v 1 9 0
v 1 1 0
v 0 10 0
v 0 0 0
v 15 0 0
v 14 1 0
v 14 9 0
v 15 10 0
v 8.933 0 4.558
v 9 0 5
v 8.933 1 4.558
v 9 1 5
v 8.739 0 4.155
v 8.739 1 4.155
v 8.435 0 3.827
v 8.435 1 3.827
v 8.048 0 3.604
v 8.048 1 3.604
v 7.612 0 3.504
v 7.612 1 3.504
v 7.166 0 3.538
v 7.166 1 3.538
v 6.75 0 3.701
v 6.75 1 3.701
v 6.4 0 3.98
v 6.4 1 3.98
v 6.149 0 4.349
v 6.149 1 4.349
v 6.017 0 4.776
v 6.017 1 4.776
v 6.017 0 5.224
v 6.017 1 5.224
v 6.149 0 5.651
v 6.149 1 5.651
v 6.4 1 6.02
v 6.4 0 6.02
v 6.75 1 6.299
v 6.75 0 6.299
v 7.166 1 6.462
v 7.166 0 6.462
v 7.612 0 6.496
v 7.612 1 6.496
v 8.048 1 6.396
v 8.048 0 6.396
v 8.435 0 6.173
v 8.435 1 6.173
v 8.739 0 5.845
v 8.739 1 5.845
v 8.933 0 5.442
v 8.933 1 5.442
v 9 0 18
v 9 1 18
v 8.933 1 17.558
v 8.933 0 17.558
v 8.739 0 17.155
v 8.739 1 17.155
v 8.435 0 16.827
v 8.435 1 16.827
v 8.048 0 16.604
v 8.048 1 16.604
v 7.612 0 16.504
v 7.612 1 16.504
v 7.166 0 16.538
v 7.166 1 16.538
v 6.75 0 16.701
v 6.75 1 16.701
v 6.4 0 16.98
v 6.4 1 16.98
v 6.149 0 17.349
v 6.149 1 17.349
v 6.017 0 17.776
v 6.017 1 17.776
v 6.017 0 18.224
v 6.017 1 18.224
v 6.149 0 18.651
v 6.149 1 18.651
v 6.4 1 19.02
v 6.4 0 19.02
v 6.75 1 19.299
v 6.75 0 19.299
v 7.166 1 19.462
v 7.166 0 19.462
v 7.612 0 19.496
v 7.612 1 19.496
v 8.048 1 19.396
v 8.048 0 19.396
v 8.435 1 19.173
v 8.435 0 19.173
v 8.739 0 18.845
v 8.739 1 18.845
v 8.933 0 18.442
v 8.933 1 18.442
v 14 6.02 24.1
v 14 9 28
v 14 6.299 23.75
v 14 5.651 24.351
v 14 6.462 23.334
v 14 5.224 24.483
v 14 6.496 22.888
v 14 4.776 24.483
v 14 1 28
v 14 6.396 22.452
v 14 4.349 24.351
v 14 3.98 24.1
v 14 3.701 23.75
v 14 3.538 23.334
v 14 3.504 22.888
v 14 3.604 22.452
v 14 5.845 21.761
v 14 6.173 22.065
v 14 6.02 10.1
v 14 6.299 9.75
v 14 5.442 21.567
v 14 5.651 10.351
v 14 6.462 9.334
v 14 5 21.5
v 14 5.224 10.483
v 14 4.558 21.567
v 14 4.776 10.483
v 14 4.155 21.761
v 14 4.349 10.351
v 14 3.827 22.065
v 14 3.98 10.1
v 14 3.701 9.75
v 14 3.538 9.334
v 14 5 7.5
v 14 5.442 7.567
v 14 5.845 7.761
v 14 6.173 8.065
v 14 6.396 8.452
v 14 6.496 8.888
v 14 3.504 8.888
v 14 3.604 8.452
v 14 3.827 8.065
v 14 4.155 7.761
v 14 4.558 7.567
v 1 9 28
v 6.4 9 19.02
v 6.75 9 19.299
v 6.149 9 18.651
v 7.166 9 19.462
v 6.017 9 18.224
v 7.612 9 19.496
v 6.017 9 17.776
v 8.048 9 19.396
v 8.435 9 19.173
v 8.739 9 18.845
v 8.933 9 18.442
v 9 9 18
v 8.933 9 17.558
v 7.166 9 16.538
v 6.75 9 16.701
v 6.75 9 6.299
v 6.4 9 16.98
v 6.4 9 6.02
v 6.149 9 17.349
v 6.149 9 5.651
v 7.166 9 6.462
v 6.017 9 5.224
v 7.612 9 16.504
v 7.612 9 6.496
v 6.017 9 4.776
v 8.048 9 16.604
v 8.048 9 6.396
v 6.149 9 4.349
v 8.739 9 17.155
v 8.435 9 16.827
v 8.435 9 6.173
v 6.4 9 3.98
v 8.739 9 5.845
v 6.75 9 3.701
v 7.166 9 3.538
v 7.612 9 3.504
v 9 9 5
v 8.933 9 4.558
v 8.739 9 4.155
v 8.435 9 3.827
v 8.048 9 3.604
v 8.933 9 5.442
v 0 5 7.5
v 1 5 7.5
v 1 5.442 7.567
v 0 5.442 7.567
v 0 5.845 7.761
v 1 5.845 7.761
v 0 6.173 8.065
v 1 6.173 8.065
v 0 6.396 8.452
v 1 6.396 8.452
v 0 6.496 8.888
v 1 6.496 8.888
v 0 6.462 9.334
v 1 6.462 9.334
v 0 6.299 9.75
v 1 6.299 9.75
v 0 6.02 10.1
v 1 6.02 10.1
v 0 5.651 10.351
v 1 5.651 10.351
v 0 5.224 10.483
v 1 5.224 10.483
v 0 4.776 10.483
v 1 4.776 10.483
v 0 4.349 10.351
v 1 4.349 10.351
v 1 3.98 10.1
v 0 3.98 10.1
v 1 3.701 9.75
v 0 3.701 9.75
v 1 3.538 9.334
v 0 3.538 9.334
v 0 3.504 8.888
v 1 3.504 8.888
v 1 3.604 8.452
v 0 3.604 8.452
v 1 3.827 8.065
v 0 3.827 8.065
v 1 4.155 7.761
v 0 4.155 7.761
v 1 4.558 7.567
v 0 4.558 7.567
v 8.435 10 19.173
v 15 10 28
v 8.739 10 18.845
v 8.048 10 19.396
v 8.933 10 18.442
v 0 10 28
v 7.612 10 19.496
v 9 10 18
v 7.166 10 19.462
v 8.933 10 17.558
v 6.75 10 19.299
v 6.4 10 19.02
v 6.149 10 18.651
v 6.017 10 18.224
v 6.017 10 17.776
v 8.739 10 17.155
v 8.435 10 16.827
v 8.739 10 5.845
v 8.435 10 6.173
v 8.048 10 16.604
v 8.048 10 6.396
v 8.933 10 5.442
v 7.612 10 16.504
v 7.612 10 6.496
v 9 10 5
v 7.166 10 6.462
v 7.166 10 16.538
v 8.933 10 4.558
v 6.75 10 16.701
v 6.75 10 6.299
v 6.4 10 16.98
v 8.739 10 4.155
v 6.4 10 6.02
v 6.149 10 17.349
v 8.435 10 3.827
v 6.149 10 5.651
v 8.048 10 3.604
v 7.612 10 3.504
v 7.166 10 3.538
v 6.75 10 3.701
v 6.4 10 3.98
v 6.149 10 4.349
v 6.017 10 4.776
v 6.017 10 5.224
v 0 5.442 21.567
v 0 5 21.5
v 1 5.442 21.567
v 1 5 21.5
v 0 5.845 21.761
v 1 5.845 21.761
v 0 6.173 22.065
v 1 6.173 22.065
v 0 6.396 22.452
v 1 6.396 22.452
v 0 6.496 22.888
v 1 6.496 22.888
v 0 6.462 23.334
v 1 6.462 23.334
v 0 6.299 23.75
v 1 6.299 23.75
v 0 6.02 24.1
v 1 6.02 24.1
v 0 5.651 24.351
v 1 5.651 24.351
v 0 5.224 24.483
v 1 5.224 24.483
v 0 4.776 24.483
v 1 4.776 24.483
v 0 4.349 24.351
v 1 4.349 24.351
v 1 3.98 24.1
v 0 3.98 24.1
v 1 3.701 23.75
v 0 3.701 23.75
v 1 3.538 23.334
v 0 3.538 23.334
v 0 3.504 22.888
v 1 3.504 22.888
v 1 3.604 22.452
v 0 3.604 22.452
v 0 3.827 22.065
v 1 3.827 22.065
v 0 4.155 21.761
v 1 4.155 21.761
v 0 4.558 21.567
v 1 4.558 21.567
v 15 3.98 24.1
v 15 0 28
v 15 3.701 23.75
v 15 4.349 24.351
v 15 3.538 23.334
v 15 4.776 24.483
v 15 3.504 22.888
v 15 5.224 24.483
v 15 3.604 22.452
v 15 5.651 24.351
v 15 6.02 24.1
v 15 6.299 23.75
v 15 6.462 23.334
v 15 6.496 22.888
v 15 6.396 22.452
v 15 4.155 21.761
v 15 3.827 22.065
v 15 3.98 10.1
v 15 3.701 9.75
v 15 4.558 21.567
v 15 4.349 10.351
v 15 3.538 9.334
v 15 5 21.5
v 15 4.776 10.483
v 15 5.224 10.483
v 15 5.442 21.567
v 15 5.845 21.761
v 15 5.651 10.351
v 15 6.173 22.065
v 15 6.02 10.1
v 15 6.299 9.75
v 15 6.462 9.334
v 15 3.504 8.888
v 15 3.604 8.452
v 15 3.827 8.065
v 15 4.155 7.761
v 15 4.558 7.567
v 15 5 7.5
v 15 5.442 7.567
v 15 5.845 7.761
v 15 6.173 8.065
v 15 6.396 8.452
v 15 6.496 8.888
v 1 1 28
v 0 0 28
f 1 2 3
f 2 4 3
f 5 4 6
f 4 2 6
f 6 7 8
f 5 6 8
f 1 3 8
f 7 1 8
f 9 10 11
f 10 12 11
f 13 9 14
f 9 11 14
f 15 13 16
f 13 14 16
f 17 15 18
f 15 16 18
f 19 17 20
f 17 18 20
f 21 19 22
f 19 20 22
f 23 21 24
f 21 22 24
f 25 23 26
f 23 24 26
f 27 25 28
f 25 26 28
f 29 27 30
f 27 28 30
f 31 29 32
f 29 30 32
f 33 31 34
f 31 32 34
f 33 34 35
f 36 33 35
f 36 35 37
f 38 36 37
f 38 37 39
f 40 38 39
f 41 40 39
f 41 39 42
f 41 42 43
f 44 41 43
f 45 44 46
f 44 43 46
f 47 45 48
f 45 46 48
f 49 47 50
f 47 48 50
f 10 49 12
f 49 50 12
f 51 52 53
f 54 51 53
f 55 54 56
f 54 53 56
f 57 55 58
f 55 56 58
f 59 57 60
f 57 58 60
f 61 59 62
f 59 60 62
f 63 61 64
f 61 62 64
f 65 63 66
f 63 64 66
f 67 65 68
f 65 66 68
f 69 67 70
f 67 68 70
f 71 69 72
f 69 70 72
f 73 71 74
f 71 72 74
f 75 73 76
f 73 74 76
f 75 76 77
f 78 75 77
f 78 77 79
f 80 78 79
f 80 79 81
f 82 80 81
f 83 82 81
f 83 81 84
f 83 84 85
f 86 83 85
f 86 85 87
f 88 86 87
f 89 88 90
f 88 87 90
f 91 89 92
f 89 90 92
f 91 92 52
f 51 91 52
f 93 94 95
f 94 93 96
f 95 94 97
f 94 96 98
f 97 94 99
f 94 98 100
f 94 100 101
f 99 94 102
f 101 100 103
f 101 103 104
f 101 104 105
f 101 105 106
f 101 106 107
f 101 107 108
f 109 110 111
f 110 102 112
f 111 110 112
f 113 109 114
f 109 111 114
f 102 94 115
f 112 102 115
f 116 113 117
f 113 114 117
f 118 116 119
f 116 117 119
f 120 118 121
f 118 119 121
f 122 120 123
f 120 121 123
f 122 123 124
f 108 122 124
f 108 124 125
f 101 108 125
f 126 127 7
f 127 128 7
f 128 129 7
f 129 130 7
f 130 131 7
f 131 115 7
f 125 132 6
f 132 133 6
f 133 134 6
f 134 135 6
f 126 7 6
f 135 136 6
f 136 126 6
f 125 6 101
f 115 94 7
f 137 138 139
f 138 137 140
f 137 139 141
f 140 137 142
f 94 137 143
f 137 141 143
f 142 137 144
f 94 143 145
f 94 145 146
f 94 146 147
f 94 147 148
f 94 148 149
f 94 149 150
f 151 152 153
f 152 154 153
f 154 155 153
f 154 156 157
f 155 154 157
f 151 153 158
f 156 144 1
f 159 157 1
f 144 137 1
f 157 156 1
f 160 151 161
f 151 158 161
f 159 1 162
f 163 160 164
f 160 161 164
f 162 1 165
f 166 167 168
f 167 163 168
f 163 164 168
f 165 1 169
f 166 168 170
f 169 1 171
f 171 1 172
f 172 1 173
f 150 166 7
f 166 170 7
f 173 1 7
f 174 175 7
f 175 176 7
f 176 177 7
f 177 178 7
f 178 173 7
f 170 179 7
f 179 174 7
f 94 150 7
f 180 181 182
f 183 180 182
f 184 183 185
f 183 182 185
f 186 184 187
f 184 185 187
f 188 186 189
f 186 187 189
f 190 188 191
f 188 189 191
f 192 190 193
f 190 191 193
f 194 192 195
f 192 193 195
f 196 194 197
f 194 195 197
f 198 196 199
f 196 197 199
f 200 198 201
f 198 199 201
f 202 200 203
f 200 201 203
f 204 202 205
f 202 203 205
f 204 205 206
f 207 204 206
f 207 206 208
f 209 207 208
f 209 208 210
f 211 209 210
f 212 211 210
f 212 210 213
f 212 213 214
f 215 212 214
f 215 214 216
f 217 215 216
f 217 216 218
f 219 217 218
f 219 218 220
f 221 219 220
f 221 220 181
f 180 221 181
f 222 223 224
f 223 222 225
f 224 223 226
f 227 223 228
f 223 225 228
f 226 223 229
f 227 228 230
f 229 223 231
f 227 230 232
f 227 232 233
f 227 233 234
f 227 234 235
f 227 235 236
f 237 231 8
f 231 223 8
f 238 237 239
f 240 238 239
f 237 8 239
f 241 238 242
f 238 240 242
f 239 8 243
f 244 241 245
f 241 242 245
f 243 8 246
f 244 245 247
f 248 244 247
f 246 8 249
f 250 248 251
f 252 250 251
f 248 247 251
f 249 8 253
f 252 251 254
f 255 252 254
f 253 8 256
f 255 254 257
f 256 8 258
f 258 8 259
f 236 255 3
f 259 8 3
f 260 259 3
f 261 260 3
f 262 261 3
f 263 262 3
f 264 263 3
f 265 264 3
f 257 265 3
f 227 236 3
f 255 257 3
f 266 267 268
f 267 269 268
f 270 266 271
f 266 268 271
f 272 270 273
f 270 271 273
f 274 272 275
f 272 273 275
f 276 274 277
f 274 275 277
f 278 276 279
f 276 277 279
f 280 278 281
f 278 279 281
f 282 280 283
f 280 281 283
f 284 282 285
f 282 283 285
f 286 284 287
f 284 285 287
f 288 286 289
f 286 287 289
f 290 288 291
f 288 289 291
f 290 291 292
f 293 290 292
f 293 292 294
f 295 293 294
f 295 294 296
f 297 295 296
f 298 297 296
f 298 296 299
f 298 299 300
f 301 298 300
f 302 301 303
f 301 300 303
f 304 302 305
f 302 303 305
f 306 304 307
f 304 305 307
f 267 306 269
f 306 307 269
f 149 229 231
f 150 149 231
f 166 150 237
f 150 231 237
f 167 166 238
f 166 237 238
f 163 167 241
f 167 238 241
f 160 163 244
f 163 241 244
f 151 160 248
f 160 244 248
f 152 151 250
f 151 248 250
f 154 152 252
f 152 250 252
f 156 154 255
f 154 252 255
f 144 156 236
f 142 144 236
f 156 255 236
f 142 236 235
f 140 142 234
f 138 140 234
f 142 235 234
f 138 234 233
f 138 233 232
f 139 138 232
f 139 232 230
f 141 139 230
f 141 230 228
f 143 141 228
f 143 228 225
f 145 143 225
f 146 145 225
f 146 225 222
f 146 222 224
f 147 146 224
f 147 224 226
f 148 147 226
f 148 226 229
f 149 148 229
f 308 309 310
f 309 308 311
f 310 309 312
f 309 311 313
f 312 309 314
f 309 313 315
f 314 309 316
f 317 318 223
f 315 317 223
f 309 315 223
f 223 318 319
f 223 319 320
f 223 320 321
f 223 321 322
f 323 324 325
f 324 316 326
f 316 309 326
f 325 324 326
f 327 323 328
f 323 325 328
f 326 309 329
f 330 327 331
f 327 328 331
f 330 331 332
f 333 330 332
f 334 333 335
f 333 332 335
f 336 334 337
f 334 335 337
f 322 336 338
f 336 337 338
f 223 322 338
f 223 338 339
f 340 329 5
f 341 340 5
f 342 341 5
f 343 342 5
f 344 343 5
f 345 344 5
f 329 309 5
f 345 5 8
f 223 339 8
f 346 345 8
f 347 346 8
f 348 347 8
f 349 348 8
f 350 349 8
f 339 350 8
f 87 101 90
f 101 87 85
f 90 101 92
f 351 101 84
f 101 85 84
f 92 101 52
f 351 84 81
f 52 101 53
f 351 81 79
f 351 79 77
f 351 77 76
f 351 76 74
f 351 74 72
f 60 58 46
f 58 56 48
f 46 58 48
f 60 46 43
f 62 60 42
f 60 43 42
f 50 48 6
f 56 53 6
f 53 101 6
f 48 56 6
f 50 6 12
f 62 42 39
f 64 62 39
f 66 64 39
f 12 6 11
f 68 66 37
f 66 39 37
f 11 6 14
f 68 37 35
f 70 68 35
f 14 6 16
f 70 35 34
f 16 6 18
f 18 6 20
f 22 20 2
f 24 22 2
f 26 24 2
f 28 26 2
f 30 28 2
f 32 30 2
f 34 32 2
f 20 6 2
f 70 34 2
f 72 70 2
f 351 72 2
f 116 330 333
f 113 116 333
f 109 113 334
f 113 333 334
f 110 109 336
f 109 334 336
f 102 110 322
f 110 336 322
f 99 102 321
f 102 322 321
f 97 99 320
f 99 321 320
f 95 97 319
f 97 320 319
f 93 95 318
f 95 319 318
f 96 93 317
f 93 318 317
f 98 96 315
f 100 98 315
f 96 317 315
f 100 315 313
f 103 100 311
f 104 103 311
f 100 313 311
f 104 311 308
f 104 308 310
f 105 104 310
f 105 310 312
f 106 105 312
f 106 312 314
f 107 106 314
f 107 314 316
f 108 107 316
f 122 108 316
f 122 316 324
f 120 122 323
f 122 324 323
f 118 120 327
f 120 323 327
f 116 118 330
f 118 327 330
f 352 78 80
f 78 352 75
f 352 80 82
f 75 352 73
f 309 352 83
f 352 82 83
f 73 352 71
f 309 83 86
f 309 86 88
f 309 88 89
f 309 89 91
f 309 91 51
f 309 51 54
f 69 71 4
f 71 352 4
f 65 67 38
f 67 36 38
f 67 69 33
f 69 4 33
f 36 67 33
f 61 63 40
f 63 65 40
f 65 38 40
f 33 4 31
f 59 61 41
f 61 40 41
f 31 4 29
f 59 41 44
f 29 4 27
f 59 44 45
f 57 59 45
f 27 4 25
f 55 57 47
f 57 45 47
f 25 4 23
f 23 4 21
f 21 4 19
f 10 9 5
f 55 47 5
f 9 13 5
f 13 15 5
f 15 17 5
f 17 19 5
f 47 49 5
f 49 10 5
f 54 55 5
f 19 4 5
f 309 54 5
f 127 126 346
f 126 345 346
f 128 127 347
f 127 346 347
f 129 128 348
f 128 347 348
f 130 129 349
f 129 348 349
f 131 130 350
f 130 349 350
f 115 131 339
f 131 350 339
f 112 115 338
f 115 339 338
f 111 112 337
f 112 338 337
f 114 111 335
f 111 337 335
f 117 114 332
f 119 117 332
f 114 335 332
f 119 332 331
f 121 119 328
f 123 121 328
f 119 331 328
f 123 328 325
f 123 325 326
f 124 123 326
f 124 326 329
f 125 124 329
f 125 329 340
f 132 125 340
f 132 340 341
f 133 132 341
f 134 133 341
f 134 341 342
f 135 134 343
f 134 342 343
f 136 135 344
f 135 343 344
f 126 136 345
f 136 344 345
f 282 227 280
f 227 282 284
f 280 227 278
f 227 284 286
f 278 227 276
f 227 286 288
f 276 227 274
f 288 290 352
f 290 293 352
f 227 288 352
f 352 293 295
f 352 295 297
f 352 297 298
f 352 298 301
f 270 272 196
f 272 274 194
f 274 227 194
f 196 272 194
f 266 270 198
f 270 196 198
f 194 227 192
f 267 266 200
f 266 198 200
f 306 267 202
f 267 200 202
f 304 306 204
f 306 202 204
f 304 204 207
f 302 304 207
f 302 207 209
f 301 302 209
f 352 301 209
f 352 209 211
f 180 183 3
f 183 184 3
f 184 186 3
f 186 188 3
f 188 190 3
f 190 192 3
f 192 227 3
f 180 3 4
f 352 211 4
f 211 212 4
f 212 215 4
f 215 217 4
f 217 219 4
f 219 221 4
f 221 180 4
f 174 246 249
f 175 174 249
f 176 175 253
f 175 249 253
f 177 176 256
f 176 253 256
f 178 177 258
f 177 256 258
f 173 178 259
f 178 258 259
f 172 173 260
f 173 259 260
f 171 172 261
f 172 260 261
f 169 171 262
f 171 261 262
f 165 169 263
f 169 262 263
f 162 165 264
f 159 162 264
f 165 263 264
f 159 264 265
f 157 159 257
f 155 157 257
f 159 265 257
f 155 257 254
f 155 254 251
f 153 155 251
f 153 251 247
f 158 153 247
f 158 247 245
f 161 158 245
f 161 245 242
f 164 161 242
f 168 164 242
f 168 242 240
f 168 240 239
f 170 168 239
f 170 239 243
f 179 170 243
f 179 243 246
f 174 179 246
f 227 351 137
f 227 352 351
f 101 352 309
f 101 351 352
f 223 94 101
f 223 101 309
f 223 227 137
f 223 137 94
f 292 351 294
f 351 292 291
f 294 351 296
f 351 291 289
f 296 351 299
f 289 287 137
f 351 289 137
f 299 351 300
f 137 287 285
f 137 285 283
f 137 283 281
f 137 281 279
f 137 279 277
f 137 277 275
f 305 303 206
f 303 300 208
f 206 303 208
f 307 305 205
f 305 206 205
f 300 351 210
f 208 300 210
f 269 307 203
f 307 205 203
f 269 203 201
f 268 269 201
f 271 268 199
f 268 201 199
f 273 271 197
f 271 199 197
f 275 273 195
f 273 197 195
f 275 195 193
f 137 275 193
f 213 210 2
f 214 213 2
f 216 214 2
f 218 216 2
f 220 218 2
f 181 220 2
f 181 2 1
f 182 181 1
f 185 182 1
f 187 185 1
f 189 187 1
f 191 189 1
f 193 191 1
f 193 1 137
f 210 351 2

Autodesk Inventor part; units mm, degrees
ref_plane "YZ Plane" through (0, 0, 0) normal (1, 0, 0) x (0, 1, 0)
ref_plane "XZ Plane" through (0, 0, 0) normal (0, 1, 0) x (-1, 0, 0)
ref_plane "XY Plane" through (0, 0, 0) normal (0, 0, 1) x (1, 0, 0)
sketch "Sketch1" plane through (0, 0, 0) normal (0, 0, 1) x (1, 0, 0)
  line L0 (0, 0) -> (15, 0)
  line L1 (15, 0) -> (15, 10)
  line L2 (15, 10) -> (0, 10)
  line L3 (0, 10) -> (0, 0)
  line L4 (1, 9) -> (14, 9)
  line L5 (14, 9) -> (14, 1)
  line L6 (14, 1) -> (1, 1)
  line L7 (1, 1) -> (1, 9)
  dimension "d0" = 15
  dimension "d1" = 10
  dimension "d2" = 13
  dimension "d3" = 8
  dimension "d4" = 1
  dimension "d5" = 1
extrude "Extrusion1" add sketch "Sketch1" along normal blind 28
sketch "Sketch2" plane through (0, 10, 0) normal (0, 1, 0) x (1, 0, 0)
  line L0 (15, 0) -> (0, 0) projected
  line L1 (0, 0) -> (0, -28) projected
  line L2 (15, -28) -> (0, -28) projected
  line L3 (15, 0) -> (15, -28) projected
  circle A0 centre (7.5, -5) radius 1.5
  circle A1 centre (7.5, -18) radius 1.5
  dimension "d8" = 3
  dimension "d9" = 3
  dimension "d10" = 7.5
  dimension "d11" = 7.5
  dimension "d12" = 5
  dimension "d13" = 10
extrude "Extrusion2" cut sketch "Sketch2" against normal up to surface (10 mm away) contours A0 | A1
sketch "Sketch3" plane through (15, 0, 0) normal (1, 0, 0) x (0, 0, -1)
  line L0 (0, 0) -> (0, 10) projected
  line L1 (0, 10) -> (-28, 10) projected
  line L2 (-28, 0) -> (-28, 10) projected
  line L3 (0, 0) -> (-28, 0) projected
  circle A0 centre (-9, 5) radius 1.5
  circle A1 centre (-23, 5) radius 1.5
  dimension "d16" = 3
  dimension "d17" = 5
  dimension "d18" = 9
  dimension "d21" = 3
  dimension "d22" = 5
  dimension "d23" = 5
extrude "Extrusion3" cut sketch "Sketch3" against normal up to surface (15 mm away) contours A0 | A1
properties part number "profile3" material "Aluminum 6061, Welded"
